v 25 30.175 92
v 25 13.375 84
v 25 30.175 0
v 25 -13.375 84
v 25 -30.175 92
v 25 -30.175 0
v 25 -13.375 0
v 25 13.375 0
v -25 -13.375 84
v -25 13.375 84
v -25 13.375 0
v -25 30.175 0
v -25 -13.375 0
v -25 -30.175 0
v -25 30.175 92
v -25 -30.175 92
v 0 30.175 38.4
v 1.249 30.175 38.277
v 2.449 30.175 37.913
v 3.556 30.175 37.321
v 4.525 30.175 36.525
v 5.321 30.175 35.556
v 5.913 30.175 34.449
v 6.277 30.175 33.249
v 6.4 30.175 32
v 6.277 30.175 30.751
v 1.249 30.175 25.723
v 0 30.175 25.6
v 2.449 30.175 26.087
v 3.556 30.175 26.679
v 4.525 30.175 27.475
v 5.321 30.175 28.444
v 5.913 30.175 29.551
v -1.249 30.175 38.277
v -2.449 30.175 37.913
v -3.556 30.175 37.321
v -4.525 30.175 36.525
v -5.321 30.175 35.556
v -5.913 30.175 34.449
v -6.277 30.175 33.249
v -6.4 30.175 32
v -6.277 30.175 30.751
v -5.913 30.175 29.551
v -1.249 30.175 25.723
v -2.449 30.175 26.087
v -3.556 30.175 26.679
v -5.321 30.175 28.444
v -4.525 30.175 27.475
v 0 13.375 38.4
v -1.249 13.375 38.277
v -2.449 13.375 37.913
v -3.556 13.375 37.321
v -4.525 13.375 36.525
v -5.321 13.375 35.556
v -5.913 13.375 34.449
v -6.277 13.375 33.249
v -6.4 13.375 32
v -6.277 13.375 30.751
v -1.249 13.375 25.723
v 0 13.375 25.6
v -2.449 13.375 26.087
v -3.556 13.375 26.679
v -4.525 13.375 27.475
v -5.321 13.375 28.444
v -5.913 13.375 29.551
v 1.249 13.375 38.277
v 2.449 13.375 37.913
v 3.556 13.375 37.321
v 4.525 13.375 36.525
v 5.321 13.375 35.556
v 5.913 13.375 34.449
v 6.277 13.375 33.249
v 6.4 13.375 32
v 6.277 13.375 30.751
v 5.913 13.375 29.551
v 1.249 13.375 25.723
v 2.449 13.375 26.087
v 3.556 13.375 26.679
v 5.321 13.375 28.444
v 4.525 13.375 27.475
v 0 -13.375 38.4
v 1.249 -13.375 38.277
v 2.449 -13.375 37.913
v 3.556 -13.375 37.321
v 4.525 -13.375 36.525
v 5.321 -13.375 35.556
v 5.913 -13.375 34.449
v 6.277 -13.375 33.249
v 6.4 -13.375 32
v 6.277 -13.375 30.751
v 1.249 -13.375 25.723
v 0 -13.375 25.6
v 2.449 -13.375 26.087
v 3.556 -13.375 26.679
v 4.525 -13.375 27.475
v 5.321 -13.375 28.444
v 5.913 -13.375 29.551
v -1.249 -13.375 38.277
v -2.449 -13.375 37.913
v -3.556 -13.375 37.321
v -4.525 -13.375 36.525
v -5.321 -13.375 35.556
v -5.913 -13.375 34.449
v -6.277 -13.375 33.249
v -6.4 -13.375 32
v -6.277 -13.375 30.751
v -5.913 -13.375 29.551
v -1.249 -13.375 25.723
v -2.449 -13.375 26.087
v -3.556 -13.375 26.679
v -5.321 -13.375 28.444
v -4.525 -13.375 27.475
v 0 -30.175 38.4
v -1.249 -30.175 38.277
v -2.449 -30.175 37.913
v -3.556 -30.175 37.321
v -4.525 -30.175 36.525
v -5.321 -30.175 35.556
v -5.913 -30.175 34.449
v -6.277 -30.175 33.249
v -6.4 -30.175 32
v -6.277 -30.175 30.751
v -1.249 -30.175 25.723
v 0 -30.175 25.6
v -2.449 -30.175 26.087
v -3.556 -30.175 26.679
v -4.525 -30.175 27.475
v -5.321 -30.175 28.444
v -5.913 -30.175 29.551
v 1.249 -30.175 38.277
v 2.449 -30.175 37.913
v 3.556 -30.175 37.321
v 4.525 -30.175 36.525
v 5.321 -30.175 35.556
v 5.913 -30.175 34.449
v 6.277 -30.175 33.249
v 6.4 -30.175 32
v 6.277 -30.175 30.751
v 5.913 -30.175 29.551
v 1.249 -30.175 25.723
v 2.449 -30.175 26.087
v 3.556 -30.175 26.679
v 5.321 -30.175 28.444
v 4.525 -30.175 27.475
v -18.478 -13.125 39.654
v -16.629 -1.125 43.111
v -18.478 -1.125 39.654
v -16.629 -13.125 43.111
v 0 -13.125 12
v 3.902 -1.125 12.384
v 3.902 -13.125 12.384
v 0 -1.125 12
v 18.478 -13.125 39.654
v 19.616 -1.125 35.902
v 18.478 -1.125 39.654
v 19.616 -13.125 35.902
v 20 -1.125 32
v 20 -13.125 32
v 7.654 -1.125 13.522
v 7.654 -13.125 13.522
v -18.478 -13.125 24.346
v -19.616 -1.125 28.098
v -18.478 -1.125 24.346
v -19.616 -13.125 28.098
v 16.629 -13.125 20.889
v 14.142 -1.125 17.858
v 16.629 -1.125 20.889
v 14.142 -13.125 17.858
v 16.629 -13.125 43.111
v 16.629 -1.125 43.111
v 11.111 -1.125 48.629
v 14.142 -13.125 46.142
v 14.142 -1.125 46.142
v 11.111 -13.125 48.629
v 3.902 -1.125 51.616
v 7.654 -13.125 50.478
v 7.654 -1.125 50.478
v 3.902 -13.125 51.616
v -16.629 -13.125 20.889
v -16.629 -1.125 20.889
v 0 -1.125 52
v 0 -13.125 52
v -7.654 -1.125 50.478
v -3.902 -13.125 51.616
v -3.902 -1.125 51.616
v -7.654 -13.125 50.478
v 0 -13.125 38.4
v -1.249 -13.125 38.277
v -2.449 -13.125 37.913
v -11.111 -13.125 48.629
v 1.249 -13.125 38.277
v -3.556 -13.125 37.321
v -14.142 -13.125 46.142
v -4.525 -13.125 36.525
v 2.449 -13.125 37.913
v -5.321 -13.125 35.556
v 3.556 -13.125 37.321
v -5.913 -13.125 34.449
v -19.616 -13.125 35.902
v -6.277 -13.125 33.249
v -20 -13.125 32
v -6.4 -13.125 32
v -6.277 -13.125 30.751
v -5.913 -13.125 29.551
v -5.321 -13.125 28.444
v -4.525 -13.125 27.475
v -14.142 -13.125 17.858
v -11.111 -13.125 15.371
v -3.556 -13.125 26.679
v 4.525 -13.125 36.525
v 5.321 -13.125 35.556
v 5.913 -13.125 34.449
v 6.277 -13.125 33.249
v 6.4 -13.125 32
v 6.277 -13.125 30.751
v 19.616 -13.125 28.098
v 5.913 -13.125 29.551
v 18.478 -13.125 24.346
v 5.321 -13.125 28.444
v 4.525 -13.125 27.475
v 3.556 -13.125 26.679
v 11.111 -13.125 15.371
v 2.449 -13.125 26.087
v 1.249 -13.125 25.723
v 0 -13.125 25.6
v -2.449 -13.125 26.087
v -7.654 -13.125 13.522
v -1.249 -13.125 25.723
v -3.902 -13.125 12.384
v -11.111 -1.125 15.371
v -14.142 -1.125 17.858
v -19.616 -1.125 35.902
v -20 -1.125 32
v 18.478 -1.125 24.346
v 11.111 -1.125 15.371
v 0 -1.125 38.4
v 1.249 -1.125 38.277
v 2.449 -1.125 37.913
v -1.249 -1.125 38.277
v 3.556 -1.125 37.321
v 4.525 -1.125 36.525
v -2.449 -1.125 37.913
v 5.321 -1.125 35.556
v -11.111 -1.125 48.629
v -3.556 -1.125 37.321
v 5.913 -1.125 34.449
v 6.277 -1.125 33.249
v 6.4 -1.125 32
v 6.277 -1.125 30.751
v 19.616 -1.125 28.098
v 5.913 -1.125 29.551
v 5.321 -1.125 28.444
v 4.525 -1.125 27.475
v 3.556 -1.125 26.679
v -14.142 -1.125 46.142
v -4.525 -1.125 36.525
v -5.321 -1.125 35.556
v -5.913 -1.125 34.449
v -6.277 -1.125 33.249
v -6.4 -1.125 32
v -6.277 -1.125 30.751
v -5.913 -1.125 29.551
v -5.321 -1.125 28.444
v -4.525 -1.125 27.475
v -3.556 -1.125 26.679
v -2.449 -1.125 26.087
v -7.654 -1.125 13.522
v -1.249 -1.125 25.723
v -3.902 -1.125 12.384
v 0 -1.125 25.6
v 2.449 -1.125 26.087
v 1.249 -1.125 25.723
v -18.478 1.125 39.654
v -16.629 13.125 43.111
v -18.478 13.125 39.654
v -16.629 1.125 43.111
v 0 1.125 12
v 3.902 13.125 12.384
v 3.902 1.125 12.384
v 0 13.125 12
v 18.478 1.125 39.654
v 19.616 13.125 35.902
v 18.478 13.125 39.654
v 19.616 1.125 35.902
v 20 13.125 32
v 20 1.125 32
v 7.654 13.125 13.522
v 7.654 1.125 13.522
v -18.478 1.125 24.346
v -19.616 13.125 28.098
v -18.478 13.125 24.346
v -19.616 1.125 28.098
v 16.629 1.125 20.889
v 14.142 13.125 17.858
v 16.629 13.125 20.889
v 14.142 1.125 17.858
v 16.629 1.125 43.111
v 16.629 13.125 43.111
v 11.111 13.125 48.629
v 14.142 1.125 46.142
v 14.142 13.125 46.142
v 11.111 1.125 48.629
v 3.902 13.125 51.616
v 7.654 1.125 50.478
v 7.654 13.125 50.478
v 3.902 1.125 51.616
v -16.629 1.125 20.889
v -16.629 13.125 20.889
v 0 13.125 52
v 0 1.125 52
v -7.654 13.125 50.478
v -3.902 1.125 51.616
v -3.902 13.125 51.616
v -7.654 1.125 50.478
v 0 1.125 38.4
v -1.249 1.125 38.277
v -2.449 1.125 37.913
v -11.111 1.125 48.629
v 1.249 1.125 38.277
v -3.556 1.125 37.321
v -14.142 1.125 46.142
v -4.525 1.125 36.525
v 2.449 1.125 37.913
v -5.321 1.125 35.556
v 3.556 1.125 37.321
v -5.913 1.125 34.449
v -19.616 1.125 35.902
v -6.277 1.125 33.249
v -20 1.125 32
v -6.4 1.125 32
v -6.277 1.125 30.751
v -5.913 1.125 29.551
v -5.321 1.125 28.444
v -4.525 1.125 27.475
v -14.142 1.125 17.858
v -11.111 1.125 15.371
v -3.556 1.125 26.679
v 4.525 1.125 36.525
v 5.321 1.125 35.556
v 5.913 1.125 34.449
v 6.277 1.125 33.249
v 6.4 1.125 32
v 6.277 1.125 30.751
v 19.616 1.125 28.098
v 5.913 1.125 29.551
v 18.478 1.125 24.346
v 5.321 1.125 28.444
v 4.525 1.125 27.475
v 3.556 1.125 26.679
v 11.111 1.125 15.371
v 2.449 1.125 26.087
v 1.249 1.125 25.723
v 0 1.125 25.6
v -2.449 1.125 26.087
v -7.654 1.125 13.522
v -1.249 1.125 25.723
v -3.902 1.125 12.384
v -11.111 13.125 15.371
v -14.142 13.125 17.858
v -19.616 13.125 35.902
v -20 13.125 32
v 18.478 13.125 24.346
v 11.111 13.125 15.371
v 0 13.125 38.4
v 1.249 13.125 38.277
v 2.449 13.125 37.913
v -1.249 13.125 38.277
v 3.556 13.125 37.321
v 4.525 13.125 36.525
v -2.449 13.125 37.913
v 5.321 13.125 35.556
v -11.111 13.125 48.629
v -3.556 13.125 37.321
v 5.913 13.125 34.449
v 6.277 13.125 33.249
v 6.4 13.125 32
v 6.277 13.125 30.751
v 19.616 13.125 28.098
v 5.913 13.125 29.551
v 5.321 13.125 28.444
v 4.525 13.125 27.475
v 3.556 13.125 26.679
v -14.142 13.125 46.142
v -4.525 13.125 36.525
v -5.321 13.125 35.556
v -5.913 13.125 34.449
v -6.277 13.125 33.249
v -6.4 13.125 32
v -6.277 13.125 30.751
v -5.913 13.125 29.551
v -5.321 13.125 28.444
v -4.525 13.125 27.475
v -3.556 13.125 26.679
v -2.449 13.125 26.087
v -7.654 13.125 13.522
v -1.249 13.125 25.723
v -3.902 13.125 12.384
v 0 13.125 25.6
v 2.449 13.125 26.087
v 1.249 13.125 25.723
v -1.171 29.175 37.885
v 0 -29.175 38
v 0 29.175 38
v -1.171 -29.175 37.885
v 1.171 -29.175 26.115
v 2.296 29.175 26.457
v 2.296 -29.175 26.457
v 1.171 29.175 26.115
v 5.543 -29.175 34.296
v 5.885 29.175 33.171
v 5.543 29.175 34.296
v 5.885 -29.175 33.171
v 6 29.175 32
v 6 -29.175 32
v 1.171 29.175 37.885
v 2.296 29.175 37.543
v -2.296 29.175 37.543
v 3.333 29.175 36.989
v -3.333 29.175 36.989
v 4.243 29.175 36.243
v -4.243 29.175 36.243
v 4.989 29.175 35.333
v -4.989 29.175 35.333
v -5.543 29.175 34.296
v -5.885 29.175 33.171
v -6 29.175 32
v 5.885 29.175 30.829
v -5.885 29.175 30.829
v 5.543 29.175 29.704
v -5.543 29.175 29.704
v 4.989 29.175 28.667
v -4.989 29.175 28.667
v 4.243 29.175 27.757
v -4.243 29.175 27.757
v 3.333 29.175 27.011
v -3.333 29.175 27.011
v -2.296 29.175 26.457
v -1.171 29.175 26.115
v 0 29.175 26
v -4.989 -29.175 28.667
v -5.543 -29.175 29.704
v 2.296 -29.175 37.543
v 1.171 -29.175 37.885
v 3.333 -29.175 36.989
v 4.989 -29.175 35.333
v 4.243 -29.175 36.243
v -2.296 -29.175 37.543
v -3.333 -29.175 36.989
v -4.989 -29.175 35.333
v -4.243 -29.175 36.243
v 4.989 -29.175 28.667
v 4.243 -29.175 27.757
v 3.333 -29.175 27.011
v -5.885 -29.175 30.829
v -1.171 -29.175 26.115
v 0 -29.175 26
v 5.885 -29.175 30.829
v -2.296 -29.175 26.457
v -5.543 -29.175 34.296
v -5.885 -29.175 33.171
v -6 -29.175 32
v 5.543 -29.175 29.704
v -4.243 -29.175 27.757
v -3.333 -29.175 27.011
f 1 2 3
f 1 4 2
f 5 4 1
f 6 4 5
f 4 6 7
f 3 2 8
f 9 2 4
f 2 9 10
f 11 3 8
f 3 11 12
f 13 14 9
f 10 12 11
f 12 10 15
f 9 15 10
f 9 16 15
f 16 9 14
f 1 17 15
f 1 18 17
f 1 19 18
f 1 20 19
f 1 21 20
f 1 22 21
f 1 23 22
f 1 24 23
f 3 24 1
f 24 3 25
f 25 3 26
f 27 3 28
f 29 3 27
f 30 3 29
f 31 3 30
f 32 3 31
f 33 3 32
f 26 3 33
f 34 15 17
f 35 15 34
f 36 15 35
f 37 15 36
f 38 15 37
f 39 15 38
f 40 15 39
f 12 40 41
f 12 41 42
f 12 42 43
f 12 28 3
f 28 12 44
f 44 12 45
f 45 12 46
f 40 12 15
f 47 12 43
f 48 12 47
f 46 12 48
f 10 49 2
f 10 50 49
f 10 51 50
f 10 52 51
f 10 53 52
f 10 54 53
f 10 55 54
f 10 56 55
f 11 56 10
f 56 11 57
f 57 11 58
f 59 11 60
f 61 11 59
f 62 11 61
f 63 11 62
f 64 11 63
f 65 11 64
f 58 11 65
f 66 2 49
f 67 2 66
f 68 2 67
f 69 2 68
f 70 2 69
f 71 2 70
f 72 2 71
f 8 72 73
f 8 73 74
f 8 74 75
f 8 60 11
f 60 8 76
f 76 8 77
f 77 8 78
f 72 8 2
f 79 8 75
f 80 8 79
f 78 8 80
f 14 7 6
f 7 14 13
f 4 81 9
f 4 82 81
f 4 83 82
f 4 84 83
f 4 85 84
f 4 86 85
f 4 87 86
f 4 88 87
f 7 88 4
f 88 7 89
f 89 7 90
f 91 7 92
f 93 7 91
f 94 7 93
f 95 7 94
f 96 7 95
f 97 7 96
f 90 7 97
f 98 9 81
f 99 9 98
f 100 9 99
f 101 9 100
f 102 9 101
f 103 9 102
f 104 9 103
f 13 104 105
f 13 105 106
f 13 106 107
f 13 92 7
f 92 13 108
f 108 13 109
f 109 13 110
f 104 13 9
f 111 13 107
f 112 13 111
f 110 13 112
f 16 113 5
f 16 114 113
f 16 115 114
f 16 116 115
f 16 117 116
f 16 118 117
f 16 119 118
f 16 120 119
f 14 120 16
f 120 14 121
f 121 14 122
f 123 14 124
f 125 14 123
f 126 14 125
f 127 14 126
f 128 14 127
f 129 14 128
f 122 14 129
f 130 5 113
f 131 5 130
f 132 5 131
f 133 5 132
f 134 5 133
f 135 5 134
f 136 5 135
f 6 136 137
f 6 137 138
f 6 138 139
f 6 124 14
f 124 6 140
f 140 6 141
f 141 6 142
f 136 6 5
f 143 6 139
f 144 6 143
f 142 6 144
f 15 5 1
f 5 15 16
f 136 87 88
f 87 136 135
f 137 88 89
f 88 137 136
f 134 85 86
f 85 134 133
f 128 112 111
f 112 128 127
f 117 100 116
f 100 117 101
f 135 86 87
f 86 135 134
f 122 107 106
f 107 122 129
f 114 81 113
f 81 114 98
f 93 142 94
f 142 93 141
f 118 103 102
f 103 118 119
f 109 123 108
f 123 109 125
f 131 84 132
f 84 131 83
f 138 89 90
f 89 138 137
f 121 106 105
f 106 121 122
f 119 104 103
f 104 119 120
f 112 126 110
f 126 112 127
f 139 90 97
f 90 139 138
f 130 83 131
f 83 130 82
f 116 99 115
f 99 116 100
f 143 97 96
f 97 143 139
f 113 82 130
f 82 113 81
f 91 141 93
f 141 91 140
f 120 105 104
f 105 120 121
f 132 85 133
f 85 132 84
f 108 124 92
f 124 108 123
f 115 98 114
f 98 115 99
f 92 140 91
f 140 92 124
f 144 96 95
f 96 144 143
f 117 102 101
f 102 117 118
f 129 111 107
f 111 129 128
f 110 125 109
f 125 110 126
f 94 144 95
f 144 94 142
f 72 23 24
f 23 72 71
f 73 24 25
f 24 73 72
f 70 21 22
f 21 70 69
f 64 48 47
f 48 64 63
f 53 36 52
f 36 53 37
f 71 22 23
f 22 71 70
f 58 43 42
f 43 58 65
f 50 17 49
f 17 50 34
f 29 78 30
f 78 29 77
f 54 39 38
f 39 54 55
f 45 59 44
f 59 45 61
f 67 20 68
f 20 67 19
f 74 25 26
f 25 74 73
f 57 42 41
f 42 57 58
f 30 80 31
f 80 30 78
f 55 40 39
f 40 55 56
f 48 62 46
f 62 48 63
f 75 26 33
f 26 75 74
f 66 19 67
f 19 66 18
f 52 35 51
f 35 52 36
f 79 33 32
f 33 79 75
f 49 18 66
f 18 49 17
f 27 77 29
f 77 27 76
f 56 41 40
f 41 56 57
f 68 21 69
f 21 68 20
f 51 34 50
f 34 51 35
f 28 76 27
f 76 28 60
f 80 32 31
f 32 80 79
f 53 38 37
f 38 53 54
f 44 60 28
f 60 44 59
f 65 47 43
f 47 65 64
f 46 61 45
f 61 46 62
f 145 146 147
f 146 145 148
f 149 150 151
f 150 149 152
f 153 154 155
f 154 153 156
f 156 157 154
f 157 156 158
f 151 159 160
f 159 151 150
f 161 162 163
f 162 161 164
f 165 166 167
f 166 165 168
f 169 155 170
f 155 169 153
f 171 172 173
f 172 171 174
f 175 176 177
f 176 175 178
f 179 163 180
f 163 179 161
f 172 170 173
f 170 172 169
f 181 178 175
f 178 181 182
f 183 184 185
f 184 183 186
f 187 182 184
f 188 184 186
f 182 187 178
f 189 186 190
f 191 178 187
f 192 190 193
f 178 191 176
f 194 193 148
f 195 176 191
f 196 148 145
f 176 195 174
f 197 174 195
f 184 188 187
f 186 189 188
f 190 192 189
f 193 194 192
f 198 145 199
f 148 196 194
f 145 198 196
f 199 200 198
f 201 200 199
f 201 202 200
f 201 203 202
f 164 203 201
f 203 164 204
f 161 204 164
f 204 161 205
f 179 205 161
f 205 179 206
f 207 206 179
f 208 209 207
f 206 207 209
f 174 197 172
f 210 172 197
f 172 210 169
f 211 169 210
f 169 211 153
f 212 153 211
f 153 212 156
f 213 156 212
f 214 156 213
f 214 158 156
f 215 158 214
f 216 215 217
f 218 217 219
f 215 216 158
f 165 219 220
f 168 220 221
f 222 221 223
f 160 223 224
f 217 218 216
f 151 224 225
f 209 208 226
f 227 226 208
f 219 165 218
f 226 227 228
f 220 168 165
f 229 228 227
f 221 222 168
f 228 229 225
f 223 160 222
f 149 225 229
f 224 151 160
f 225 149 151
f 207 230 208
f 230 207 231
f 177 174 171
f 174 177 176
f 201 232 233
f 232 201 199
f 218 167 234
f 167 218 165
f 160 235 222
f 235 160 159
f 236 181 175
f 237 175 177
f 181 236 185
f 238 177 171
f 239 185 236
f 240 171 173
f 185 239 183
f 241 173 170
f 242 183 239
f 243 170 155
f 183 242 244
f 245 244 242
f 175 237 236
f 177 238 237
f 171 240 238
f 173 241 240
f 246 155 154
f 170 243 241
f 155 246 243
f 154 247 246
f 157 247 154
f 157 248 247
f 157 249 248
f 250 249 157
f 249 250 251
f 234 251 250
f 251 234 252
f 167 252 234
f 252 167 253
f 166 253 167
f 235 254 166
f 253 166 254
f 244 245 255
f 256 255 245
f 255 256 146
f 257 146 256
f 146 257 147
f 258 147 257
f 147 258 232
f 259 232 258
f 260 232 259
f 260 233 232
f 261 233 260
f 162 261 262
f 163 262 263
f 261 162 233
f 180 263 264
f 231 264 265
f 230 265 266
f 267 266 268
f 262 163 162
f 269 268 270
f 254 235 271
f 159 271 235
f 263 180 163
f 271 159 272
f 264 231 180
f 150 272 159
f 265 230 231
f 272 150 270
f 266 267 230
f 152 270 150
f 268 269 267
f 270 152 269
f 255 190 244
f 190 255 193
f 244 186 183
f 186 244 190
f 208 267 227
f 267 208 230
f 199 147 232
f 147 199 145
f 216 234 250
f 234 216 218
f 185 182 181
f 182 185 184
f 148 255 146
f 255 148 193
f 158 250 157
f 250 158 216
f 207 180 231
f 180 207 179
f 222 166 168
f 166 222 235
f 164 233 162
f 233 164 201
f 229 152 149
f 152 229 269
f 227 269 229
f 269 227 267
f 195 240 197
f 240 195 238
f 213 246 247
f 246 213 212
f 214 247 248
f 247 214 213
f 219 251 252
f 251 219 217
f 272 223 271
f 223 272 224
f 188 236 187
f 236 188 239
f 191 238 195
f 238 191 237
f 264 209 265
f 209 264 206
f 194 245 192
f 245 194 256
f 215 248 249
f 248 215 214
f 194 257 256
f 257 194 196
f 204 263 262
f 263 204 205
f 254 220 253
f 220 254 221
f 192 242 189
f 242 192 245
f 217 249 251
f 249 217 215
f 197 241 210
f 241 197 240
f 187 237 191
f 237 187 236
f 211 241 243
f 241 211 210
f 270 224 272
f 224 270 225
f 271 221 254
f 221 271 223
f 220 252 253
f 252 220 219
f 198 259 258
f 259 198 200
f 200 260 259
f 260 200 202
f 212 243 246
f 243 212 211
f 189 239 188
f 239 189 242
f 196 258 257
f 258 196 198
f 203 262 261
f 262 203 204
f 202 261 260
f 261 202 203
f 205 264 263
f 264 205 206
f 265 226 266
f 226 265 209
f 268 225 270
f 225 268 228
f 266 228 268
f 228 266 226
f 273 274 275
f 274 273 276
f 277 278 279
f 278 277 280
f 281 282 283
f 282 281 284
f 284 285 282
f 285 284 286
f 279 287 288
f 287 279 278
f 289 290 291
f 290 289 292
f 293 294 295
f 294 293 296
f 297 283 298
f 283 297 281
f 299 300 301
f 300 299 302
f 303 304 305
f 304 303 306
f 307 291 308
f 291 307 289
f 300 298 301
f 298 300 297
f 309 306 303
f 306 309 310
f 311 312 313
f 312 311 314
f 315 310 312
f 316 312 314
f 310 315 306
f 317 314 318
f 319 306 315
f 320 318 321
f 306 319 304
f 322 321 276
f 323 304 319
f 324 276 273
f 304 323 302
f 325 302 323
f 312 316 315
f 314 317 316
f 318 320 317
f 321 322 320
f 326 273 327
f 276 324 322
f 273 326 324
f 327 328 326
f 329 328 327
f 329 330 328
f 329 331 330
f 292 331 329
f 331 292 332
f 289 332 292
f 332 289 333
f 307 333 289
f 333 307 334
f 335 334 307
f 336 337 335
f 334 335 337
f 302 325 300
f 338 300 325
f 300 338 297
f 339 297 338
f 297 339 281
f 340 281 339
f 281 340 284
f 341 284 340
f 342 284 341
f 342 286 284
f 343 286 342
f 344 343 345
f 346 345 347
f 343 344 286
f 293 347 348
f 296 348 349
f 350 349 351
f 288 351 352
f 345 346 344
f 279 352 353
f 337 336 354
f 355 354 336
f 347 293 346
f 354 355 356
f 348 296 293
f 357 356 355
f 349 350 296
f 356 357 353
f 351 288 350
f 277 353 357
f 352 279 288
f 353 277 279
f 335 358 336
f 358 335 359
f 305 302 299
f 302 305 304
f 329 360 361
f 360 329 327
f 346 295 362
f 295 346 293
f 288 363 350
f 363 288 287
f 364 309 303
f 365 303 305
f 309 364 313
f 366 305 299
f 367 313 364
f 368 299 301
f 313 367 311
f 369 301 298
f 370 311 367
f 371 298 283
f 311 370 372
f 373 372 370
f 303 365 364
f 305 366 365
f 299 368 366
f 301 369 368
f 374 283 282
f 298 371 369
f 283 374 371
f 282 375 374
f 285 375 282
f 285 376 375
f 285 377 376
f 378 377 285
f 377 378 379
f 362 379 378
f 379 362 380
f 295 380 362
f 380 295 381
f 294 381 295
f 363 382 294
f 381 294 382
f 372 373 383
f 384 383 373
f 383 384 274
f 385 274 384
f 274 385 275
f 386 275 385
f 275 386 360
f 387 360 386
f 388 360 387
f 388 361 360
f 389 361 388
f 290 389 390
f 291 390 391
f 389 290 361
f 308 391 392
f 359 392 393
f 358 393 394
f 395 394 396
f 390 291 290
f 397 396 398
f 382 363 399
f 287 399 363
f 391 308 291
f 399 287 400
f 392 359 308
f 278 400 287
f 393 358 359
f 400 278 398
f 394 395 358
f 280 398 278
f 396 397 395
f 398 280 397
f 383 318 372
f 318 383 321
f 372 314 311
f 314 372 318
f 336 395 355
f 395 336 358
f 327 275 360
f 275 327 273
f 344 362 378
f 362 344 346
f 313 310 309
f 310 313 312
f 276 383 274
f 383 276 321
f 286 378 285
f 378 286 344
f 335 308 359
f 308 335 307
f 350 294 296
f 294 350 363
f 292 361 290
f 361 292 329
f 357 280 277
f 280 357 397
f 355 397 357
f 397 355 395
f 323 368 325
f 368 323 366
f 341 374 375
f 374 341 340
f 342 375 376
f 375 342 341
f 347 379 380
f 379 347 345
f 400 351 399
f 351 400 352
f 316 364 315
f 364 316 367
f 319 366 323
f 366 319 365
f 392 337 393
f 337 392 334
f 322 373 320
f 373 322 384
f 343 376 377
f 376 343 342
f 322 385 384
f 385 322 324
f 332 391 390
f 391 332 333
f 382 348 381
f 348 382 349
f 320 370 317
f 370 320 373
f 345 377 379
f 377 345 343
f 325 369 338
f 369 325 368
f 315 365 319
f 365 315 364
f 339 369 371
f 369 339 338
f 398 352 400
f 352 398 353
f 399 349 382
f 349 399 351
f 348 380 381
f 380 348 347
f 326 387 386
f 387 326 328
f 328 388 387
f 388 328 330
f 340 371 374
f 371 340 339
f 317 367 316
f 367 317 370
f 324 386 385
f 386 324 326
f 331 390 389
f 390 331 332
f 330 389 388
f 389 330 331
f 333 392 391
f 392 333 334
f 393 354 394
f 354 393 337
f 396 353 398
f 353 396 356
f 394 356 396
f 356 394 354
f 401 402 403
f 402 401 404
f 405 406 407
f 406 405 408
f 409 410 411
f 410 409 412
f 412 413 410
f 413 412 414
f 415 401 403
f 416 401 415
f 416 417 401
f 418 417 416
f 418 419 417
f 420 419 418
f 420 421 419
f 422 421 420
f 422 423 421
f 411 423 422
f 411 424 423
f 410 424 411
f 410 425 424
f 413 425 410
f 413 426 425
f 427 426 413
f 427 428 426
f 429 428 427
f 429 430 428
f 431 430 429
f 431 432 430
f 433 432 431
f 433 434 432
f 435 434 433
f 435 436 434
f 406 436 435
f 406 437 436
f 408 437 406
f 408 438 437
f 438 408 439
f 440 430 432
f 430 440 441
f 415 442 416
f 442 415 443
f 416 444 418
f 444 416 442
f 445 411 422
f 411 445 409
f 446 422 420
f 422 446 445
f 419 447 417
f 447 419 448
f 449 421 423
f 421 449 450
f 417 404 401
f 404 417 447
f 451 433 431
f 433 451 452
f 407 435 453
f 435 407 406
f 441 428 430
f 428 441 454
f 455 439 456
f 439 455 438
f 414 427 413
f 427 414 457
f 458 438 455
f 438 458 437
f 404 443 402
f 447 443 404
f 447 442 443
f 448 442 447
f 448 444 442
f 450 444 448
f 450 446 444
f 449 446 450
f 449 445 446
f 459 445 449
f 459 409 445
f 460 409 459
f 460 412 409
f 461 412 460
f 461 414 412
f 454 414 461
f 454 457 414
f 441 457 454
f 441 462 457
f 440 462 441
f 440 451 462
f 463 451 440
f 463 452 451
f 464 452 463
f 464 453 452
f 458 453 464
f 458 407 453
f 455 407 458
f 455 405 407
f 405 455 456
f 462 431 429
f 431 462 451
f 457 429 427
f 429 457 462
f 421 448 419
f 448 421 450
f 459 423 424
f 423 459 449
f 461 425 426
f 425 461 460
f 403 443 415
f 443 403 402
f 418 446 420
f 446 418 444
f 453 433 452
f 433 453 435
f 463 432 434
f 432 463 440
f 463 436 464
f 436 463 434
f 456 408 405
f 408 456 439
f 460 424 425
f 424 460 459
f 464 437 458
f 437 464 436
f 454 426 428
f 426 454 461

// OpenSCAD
$fn = 32;

// ------------------------------------------------------------------------
// Trolley wheel set: wheels d40, fork 84 mm tall
// Every part is its own module, assembly() places every instance.
// ------------------------------------------------------------------------

// --- part 1 ---
module trolley_fork() {
  difference() {
    union() {
      translate([-25, 13.375, 0]) cube([50, 16.8, 84]);
      translate([-25, -30.175, 0]) cube([50, 16.8, 84]);
      translate([-25, -30.175, 84]) cube([50, 60.35, 8]);
    }
    translate([0, -21.775, 32]) rotate([90, 0, 0]) cylinder(h = 18.8, d = 12.8, center = true);
    translate([0, 21.775, 32]) rotate([90, 0, 0]) cylinder(h = 18.8, d = 12.8, center = true);
  }
}

// --- part 2 ---
module trolley_wheel() {
  difference() {
      translate([0, 0, 0]) cylinder(h = 12, d = 40);
      translate([0, 0, -1]) cylinder(h = 14, d = 12.8);
    }
}

// --- part 3 ---
module trolley_axle() {
  translate([0, 0, -29.175]) cylinder(h = 58.35, d = 12);
}

// --- assembly ---
module assembly() {
  color([0.80, 0.24, 0.20]) translate([0, 0, 0]) rotate([0, 0, 0]) trolley_fork();
  color([0.20, 0.45, 0.75]) translate([0, -1.125, 32]) rotate([90, 0, 0]) trolley_wheel();
  color([0.25, 0.62, 0.32]) translate([0, 13.125, 32]) rotate([90, 0, 0]) trolley_wheel();
  color([0.92, 0.70, 0.18]) translate([0, 0, 32]) rotate([90, 0, 0]) trolley_axle();
}

assembly();
